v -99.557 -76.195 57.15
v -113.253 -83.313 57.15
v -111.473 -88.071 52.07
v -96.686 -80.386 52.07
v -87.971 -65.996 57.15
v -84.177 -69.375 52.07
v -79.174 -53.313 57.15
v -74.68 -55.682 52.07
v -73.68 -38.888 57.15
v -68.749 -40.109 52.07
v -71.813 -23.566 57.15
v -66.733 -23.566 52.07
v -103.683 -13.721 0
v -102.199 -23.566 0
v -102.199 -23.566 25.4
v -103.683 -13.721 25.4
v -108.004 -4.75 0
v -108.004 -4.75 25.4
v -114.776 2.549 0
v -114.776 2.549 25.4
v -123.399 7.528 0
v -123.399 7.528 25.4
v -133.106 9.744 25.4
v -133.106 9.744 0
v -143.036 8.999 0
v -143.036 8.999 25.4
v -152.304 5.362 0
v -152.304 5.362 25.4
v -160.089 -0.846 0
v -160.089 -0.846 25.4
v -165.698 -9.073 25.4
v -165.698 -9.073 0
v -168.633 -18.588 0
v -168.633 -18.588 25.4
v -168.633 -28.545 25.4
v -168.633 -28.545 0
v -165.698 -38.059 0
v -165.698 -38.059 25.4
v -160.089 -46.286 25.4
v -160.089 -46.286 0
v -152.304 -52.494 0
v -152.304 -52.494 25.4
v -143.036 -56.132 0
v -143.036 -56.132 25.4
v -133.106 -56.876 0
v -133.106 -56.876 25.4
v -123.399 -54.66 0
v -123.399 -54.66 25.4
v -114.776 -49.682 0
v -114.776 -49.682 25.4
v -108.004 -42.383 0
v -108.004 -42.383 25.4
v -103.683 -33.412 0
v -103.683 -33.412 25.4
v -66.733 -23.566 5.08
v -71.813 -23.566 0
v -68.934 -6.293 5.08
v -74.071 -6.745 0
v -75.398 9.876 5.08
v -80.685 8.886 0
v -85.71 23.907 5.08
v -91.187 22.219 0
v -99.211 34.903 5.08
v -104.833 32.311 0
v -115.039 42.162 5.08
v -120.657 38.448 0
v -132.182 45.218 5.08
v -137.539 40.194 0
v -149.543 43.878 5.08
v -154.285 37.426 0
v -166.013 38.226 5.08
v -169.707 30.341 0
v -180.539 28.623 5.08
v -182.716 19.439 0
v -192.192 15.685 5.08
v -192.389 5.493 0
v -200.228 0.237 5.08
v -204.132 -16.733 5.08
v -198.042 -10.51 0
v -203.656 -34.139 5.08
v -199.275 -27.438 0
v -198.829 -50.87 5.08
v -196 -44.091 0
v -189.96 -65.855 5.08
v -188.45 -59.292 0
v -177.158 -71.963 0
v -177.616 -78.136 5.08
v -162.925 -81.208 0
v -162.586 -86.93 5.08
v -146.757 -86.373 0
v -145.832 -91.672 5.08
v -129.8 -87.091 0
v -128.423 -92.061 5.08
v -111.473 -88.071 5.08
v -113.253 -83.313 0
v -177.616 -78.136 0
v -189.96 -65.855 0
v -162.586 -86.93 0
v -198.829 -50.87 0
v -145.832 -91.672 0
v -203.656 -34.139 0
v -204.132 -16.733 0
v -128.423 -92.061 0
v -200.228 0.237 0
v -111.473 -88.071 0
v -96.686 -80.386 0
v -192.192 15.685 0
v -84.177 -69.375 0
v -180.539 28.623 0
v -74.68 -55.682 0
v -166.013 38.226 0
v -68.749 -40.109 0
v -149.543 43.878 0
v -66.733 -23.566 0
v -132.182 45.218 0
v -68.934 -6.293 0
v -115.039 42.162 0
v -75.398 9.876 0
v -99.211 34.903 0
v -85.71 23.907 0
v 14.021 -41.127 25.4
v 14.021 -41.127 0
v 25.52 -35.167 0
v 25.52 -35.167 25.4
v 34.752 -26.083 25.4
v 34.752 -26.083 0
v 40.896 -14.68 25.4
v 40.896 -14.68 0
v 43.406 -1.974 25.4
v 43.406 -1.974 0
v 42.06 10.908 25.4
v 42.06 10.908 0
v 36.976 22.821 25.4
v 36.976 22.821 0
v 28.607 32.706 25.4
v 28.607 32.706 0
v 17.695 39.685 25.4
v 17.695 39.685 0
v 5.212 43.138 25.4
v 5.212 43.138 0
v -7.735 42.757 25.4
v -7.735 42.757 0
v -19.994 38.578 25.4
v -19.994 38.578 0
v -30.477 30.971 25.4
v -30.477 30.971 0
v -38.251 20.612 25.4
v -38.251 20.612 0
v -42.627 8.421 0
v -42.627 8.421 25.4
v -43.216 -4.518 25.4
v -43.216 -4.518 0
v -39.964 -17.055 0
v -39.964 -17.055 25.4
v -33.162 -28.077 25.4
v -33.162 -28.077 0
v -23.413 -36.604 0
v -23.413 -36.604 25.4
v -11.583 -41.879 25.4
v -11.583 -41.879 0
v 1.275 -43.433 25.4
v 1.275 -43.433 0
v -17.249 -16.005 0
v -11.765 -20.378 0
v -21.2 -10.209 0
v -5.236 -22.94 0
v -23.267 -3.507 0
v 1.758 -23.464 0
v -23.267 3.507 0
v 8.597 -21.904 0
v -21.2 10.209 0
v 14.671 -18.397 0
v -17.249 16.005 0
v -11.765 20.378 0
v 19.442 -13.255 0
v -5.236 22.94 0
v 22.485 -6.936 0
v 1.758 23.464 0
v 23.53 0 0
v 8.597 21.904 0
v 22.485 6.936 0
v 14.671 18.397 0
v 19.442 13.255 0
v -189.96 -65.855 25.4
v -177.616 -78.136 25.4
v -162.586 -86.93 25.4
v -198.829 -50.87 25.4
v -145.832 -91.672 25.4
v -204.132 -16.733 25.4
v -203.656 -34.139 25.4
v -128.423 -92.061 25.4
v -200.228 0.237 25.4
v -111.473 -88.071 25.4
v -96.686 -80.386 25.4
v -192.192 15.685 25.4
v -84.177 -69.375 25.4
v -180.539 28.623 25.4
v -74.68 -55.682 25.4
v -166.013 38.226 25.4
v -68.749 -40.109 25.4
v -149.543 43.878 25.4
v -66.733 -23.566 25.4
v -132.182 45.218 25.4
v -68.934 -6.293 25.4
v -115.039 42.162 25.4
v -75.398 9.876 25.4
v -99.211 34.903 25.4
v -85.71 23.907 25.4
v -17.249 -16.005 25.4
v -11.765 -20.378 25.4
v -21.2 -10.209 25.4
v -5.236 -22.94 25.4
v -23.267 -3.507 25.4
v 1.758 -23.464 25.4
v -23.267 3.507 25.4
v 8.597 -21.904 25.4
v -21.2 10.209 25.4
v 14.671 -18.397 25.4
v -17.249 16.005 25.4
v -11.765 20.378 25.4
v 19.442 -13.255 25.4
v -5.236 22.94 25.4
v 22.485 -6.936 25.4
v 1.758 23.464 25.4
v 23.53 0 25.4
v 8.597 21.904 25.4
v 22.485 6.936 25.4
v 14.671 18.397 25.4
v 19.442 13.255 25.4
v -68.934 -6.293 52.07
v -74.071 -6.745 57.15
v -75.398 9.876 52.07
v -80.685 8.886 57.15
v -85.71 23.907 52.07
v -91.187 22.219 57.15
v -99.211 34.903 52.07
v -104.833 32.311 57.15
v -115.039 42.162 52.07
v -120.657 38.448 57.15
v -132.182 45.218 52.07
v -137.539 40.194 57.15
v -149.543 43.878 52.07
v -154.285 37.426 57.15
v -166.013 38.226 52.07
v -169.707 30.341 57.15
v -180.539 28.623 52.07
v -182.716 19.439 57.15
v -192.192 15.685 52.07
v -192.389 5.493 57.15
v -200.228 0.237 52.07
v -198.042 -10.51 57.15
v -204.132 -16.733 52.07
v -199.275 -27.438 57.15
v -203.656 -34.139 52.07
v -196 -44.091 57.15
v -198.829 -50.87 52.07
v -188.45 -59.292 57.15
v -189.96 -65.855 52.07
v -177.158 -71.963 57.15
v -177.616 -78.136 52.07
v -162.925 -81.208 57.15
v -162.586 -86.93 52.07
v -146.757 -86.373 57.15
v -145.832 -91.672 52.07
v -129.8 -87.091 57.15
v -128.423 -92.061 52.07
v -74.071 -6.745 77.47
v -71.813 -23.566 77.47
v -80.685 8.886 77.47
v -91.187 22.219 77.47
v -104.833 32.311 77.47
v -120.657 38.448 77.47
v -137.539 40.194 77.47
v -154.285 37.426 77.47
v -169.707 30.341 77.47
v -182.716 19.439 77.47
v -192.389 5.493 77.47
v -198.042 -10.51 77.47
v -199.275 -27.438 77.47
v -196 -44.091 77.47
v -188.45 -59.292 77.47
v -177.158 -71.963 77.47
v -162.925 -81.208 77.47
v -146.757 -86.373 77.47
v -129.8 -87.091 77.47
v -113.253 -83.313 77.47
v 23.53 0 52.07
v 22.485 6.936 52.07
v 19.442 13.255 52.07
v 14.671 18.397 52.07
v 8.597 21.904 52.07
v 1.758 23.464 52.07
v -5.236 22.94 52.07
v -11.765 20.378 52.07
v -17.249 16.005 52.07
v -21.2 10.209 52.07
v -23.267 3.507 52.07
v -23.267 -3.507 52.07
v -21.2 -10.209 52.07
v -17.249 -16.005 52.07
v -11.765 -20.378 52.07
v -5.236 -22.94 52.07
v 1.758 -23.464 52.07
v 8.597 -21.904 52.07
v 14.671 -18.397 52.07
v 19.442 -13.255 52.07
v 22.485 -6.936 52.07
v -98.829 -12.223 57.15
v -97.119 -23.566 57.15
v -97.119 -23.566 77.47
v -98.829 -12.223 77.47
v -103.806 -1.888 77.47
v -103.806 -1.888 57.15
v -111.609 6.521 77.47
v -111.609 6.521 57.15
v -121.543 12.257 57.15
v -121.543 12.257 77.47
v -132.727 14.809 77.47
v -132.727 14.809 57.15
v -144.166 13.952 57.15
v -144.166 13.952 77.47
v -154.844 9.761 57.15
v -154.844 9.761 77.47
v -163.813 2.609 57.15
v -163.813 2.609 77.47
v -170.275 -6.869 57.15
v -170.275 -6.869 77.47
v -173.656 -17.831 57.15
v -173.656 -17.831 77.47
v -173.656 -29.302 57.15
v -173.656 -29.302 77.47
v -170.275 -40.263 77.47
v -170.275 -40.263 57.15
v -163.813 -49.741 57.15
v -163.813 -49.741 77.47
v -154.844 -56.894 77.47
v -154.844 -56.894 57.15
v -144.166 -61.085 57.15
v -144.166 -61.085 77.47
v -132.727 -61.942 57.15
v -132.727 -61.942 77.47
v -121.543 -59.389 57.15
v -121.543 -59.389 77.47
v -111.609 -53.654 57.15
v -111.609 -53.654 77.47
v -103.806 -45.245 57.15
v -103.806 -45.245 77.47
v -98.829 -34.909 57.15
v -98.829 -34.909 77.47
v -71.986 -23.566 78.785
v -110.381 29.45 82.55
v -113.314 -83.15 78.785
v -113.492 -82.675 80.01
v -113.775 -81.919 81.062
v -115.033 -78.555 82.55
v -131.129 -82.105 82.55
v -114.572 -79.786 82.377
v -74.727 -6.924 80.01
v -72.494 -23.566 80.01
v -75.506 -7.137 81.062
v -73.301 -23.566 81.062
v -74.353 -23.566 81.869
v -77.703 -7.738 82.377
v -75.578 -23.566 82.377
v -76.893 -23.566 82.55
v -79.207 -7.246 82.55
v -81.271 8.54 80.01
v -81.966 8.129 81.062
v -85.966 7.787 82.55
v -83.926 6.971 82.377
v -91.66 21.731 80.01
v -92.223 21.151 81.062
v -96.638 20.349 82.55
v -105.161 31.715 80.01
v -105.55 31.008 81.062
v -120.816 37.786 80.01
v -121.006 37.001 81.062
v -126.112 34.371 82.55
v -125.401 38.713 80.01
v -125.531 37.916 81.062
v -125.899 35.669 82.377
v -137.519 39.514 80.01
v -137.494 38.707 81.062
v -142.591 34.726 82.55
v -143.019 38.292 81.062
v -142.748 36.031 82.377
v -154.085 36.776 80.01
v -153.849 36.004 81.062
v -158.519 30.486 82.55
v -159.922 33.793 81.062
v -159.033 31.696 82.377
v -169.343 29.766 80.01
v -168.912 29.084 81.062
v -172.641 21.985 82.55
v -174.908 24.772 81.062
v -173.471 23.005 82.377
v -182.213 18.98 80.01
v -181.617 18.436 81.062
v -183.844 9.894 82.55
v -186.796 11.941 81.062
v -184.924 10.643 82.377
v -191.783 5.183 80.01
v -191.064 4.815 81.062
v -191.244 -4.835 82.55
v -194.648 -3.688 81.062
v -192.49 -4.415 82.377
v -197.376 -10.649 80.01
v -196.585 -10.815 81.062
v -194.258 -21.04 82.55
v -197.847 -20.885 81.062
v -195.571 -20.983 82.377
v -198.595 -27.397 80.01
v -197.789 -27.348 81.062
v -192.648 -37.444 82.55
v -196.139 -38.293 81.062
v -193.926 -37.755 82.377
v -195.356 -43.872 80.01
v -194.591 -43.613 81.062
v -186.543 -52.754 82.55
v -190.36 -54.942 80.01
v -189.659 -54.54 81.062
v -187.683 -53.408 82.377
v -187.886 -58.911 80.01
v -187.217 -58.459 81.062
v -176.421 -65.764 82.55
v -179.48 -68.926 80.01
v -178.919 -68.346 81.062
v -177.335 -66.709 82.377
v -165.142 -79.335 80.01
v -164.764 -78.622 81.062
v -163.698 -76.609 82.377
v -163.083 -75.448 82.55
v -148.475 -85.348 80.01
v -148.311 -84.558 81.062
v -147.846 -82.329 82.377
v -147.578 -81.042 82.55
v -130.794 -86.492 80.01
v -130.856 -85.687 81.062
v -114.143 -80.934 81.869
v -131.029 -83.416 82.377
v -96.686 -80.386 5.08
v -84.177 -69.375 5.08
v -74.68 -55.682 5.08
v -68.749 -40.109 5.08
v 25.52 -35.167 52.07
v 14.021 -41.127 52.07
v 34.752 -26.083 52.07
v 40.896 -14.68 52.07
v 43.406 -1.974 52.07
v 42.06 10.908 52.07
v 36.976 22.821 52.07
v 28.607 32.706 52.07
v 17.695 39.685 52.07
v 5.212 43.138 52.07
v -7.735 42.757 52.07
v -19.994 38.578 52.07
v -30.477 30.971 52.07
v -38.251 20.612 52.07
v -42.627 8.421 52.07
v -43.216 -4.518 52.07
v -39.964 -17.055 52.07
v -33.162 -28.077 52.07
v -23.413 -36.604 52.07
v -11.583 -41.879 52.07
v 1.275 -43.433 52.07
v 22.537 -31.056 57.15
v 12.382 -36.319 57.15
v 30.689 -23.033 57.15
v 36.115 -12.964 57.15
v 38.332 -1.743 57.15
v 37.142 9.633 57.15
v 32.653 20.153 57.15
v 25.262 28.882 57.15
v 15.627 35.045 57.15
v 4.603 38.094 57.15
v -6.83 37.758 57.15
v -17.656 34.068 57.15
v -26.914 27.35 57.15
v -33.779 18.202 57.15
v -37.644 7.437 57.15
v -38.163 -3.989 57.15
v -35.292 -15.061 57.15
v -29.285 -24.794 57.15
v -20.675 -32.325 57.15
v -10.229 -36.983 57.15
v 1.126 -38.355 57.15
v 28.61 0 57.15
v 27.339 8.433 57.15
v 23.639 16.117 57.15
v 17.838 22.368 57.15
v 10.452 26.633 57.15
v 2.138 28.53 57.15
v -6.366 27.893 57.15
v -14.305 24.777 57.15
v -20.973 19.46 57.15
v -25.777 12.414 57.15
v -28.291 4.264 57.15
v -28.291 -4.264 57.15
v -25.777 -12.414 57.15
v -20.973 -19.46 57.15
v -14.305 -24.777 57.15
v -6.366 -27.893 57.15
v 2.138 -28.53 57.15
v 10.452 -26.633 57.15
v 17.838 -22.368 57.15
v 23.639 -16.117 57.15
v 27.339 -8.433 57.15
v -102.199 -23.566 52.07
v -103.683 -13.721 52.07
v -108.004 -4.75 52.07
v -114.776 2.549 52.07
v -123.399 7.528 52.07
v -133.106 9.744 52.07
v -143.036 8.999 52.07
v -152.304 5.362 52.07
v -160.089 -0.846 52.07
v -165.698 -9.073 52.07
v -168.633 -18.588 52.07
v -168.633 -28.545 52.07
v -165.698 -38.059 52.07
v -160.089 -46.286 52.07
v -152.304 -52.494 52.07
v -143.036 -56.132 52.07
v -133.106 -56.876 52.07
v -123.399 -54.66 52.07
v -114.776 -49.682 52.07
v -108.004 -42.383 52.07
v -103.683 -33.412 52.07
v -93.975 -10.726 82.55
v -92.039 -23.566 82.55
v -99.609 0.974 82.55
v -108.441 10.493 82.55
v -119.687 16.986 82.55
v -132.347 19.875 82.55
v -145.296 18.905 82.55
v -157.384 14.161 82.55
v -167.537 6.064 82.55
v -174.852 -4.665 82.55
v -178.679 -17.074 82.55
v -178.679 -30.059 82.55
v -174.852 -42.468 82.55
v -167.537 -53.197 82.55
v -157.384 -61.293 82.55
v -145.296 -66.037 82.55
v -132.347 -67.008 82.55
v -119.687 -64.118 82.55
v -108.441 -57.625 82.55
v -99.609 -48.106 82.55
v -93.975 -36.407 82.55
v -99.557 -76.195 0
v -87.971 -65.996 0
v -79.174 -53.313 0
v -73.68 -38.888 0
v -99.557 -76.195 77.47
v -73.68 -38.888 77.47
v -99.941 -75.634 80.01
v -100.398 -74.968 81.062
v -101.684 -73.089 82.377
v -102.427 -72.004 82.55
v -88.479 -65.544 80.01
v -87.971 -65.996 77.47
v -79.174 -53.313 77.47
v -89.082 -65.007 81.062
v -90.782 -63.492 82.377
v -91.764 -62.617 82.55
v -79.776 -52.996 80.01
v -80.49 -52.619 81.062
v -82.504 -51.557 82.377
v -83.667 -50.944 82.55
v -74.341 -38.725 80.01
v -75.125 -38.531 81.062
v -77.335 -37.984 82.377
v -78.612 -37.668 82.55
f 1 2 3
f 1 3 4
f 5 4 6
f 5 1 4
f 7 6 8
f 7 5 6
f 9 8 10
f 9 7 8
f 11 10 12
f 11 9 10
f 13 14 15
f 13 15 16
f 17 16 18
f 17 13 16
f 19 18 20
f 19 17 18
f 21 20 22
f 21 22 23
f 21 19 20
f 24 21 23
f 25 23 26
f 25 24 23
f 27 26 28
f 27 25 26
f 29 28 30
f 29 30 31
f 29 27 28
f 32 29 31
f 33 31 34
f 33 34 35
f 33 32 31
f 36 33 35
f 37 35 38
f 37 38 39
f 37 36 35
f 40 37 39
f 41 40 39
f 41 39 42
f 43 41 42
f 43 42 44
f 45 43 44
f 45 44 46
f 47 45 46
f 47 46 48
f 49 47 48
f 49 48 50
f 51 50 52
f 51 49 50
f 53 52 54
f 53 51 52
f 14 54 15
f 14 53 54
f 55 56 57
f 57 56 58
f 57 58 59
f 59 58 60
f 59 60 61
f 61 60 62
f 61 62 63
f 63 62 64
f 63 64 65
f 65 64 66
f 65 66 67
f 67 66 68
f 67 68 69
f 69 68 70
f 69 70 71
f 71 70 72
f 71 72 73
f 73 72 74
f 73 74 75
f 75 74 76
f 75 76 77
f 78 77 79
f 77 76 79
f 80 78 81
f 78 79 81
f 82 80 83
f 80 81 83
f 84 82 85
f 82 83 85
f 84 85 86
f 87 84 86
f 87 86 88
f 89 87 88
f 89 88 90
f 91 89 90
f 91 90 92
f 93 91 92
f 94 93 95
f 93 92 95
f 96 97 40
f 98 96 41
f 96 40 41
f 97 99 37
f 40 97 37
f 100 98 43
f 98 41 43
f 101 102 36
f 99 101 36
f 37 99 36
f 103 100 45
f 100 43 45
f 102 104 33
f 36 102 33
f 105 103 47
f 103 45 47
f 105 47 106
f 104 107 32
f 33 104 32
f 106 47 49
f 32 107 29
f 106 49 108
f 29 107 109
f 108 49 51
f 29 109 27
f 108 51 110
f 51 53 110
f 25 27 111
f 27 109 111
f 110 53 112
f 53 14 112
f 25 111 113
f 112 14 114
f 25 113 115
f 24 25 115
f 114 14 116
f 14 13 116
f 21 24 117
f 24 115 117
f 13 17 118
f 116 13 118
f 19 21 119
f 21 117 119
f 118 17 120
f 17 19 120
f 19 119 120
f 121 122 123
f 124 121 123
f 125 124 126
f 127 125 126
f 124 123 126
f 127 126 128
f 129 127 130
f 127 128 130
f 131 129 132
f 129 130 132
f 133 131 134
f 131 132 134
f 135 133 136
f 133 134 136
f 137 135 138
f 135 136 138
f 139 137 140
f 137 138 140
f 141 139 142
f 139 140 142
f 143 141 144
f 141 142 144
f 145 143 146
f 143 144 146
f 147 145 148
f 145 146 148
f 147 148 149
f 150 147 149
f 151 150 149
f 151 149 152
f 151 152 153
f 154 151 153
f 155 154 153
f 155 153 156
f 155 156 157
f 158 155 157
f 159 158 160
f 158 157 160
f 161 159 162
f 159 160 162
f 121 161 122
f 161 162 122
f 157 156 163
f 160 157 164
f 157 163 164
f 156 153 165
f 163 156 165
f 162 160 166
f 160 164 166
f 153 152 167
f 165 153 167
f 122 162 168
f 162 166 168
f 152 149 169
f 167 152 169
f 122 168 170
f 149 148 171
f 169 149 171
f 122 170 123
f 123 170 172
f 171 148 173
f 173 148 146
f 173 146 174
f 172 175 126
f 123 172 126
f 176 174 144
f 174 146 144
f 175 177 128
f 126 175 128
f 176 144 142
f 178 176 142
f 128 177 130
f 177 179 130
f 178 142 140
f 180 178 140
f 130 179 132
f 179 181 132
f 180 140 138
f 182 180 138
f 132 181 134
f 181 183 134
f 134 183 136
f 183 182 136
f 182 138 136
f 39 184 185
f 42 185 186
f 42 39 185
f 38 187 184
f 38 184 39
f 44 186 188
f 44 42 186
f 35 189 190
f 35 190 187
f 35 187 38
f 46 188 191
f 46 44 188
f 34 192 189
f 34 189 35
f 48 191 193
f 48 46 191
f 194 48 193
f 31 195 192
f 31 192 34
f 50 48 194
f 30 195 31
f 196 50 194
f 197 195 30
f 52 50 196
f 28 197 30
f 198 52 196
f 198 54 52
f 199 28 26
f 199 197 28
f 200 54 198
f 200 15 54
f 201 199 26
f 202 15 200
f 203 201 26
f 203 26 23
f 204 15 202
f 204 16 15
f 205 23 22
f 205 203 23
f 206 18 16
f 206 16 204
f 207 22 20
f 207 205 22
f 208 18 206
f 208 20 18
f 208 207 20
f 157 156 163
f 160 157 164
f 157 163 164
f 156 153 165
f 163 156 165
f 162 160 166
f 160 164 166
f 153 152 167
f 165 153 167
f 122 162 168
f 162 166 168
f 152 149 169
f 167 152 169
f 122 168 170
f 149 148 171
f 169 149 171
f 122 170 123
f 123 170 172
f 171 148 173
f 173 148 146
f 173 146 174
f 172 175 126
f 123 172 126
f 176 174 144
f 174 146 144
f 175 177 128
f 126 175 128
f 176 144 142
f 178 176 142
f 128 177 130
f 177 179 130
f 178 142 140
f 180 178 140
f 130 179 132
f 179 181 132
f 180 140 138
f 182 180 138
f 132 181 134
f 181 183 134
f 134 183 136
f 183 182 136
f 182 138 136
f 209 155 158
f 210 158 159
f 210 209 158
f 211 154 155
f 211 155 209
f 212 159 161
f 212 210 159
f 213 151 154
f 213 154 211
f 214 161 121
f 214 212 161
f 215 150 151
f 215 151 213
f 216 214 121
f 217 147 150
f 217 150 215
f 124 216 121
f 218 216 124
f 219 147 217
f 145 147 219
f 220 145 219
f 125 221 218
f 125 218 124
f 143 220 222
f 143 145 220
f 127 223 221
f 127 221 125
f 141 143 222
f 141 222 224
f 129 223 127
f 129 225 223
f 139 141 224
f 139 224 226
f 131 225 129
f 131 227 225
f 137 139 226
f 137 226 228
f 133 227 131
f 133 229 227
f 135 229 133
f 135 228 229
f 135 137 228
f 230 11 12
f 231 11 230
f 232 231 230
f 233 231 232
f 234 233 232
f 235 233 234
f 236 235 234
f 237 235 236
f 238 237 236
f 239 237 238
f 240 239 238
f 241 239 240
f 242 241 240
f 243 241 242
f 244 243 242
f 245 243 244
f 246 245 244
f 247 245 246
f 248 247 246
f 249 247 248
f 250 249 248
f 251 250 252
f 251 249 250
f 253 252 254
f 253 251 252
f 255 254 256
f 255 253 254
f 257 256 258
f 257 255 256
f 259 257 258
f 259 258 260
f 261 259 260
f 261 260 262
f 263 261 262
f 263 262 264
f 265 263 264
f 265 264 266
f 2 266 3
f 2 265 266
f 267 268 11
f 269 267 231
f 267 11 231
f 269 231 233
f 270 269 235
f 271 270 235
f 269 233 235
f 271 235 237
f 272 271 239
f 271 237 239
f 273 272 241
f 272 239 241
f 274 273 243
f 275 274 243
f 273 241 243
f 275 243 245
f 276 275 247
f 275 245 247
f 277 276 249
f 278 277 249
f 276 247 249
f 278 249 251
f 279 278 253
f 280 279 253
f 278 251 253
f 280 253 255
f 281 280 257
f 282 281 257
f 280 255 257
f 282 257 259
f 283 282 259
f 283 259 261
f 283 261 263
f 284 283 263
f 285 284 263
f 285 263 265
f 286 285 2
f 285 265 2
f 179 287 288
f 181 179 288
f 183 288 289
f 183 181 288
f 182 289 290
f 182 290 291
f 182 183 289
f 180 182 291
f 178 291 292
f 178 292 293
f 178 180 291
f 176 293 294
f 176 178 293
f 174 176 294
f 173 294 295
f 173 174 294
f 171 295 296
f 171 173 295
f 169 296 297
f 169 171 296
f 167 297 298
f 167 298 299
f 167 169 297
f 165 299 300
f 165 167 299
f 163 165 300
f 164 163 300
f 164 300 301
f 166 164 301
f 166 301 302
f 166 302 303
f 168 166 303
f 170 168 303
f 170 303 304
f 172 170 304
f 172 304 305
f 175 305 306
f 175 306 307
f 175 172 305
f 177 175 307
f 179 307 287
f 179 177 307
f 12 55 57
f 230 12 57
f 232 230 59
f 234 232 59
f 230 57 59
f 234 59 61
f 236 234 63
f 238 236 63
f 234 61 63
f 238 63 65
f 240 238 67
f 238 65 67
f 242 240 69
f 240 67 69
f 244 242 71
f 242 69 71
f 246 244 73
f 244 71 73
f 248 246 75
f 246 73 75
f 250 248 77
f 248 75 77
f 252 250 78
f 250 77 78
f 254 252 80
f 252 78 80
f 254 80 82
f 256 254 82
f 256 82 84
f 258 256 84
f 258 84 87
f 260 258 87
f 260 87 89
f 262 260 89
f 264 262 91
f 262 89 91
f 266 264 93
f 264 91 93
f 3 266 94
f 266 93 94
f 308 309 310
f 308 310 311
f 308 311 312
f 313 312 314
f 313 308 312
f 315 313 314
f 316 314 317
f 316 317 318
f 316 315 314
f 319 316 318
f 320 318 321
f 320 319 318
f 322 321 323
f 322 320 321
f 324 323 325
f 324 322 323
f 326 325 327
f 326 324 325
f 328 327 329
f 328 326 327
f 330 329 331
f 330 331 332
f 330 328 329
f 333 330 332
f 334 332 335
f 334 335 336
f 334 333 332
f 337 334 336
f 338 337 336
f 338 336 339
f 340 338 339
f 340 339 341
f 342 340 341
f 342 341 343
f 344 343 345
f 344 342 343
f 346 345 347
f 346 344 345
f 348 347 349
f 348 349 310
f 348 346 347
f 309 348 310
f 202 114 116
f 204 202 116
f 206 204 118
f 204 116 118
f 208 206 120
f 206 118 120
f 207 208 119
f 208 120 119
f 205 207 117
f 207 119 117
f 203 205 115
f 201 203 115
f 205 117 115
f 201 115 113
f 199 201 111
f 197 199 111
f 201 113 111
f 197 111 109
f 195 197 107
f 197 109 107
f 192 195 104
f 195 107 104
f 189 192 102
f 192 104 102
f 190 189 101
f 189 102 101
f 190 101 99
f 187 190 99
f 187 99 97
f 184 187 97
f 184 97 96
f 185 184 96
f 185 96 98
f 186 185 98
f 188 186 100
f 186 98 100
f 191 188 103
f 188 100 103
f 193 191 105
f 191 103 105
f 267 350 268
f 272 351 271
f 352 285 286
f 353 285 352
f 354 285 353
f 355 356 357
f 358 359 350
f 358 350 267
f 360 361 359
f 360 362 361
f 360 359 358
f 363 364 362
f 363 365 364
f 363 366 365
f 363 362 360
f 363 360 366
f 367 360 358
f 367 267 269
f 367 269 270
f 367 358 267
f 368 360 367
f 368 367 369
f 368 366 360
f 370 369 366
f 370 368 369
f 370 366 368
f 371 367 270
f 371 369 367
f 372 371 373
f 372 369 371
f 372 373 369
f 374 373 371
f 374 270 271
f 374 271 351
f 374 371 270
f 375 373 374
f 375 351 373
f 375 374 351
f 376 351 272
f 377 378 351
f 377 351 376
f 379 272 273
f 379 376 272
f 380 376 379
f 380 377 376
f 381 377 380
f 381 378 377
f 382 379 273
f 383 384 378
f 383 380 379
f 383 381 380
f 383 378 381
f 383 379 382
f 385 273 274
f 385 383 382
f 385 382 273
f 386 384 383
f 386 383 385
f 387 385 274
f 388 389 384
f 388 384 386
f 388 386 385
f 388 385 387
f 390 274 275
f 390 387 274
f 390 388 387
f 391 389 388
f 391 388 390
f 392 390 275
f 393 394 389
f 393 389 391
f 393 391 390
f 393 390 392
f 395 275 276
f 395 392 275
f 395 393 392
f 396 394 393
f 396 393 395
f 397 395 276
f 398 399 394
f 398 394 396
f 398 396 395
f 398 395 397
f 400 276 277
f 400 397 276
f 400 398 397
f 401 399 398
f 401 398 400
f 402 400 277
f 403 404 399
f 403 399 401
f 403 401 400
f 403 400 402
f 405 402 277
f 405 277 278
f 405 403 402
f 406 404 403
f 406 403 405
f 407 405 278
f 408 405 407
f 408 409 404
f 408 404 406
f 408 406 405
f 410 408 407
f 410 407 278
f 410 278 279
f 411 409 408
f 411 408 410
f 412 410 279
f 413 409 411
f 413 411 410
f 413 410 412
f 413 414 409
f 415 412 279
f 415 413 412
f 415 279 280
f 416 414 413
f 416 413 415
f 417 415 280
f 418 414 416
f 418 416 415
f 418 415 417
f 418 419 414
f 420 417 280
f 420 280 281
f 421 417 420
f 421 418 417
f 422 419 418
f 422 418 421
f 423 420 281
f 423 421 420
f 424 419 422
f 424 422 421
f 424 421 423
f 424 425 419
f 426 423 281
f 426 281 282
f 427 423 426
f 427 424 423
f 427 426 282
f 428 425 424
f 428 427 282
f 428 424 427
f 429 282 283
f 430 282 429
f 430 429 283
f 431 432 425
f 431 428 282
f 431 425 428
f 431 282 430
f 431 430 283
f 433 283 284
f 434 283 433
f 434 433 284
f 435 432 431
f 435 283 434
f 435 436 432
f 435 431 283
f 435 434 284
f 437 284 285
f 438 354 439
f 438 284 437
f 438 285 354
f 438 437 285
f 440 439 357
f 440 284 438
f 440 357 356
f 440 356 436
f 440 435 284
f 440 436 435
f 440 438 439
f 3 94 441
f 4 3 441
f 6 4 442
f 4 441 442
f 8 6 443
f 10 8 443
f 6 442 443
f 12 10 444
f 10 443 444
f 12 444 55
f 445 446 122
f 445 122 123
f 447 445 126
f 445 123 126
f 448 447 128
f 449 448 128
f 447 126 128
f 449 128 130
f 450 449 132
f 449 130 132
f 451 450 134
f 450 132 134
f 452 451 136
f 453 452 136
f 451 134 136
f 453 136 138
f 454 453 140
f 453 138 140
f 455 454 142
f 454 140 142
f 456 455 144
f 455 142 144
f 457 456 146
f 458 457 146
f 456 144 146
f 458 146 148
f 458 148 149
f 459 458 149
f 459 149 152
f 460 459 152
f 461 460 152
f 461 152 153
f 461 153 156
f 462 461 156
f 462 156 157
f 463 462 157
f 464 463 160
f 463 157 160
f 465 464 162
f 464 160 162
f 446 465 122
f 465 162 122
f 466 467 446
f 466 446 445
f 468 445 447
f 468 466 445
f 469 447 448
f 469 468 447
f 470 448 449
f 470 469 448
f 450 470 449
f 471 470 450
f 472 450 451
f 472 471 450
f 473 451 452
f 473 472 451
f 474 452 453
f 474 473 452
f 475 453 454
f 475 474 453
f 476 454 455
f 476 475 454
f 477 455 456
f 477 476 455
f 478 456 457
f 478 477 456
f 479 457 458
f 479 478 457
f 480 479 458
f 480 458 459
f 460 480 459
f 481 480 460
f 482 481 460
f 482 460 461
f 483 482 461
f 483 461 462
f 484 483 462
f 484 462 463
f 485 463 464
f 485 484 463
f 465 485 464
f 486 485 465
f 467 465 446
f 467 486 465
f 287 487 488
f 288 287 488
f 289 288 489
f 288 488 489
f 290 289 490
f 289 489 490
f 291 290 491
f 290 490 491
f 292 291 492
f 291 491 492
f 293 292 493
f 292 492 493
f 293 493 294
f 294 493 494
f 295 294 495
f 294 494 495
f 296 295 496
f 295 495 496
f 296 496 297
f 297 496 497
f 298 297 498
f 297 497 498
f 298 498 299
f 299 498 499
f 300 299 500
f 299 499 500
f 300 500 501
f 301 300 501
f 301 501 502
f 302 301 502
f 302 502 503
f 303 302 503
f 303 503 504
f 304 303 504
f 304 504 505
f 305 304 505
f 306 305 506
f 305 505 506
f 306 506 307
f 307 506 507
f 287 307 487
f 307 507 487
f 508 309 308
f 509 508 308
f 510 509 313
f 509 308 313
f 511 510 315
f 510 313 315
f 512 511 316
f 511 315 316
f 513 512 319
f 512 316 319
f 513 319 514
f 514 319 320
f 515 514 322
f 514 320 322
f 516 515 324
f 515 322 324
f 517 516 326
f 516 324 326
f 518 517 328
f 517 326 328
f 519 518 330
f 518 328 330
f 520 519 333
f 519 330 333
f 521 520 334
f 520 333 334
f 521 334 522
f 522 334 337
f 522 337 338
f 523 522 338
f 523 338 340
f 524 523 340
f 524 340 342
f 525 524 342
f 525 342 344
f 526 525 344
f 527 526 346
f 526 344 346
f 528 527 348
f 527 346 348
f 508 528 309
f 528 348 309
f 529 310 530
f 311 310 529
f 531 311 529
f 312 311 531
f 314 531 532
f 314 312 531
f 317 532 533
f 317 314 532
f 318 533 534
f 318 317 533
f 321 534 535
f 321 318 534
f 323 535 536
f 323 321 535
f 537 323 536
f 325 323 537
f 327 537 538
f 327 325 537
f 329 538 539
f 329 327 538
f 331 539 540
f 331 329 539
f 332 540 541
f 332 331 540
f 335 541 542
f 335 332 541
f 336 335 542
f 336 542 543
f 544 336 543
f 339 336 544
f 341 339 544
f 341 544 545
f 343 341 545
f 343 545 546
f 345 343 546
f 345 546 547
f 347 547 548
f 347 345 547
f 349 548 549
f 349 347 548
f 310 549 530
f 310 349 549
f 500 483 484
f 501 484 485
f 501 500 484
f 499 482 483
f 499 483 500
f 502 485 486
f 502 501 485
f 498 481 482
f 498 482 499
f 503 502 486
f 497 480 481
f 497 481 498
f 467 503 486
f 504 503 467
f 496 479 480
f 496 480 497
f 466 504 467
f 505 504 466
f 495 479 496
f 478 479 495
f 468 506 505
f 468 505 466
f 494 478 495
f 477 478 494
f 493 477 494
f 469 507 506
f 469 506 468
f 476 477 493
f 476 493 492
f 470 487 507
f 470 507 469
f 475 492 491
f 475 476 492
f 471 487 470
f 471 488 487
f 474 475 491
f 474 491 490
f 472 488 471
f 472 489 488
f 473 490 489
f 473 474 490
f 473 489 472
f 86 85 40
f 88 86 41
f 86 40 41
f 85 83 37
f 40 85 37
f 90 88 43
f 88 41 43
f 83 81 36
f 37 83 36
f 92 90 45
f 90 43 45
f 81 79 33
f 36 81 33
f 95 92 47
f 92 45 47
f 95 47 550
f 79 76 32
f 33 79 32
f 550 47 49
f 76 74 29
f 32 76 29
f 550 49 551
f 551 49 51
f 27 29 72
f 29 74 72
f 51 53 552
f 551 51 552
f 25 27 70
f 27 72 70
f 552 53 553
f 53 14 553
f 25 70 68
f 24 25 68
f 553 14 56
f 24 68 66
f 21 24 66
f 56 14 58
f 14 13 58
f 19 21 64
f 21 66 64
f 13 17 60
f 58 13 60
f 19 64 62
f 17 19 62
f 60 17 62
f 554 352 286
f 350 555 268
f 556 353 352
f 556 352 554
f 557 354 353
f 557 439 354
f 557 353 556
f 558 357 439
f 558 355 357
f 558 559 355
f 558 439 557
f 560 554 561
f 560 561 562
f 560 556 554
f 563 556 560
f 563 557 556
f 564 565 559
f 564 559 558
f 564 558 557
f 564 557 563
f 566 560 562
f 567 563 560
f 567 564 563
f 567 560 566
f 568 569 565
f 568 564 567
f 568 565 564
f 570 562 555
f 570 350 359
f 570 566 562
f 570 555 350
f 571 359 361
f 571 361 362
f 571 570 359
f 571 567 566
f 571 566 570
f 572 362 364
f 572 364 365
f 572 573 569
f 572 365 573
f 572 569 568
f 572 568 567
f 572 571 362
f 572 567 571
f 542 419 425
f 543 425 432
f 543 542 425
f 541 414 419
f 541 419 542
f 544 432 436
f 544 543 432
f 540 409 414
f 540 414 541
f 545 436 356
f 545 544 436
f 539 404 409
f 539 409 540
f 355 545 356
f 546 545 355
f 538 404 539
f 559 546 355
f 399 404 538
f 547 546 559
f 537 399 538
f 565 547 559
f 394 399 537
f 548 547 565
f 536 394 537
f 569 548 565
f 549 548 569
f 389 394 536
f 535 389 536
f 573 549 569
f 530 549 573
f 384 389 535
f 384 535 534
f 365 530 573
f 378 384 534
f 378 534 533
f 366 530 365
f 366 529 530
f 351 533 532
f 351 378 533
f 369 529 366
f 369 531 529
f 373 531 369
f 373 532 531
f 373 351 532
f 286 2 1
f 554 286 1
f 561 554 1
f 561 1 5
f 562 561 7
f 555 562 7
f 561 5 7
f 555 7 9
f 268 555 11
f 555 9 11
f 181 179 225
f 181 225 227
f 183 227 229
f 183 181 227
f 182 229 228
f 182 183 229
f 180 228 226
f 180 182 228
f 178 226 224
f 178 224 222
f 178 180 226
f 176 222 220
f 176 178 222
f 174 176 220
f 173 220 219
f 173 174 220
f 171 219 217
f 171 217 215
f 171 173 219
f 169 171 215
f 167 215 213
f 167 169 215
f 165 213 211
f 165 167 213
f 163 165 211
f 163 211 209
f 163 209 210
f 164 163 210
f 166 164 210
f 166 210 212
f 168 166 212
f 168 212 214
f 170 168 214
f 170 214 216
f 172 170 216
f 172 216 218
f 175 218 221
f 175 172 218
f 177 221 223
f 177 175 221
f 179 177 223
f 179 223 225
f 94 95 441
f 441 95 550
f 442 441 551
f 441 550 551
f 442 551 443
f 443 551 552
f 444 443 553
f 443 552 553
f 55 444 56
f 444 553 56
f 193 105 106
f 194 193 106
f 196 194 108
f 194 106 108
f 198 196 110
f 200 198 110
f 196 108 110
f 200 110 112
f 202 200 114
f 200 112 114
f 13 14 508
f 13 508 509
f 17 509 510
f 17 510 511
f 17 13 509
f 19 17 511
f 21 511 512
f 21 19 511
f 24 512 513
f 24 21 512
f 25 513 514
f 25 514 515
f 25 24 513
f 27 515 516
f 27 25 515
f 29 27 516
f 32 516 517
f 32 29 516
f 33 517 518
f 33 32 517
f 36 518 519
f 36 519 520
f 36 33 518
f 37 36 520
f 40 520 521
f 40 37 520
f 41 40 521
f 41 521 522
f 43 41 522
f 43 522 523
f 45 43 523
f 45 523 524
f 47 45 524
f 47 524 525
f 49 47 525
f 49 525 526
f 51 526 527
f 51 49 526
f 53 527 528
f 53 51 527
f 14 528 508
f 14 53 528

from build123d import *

# Parameters (mm, degrees)
F0_R      = 33.4031923569
F1_DEPTH  = 57.15
F0_R_2    = 23.5302271484
F2_DEPTH  = 25.4
F3_SIZE   = 5.08
F3_2_SIZE = 5.08
F4_DEPTH  = 25.4
F5_R      = 5.08
F6_SIZE   = 5.08


with BuildPart() as f1:
    # F0 (on Top) → F1 (new body)
    with BuildSketch(Plane.XY):
        with BuildLine():
            ThreePointArc((-111.4734922268, -88.070607267), (-79.0129136651, -62.8171326984), (-66.7329917311, -23.5662644833))
            ThreePointArc((-66.7329917311, -23.5662644833), (-85.9374640879, 24.1453452767), (-132.8404473474, 45.2479428834))
            ThreePointArc((-132.8404473474, 45.2479428834), (-203.6044087614, -34.4649077917), (-111.4734922268, -88.070607267))
        make_face()
        with Locations((-135.6026127041, -23.5662644833)):
            Circle(F0_R, mode=Mode.SUBTRACT)
    extrude(amount=F1_DEPTH)

    # F3
    f3_edges = [f1.edges().sort_by_distance(p)[0] for p in [
        (-159.731733, 40.938078, 0),
        (-111.473492, -88.070607, 28.575),
        (-159.731733, 40.938078, 57.15),
        (-169.005805, -23.566264, 57.15),
    ]]
    chamfer(f3_edges, length=F3_SIZE)

    # F4 (add): a face of the model
    f4_faces = [f1.faces().sort_by_distance(p)[0] for p in [
        (-157.3197738153, 34.4901908242, 57.15),
    ]]
    extrude(f4_faces, amount=F4_DEPTH)

    # F5
    f5_edges = [f1.edges().sort_by_distance(p)[0] for p in [
        (-157.951907, 36.180072, 82.55),
    ]]
    fillet(f5_edges, radius=F5_R)

    # F6
    f6_edges = [f1.edges().sort_by_distance(p)[0] for p in [
        (-174.085805, -23.566264, 82.55),
    ]]
    chamfer(f6_edges, length=F6_SIZE)


with BuildPart() as f1b:
    # F0 (on Top) → F1, piece 2 (new body)
    with BuildSketch(Plane.XY):
        with BuildLine():
            ThreePointArc((43.4512658516, 0), (-35.3357747424, 25.2862715216), (14.0207986405, -41.1269949011))
            ThreePointArc((14.0207986405, -41.1269949011), (35.3357747424, -25.2862715216), (43.4512658516, 0))
        make_face()
        Circle(F0_R_2, mode=Mode.SUBTRACT)
    extrude(amount=F1_DEPTH)

    # F3#2
    f3_2_edges = [f1b.edges().sort_by_distance(p)[0] for p in [
        (-14.020799, 41.126995, 57.15),
        (-23.530227, 0, 57.15),
    ]]
    chamfer(f3_2_edges, length=F3_2_SIZE)


with BuildPart() as f2:
    # F0 (on Top) → F2 (new body)
    with BuildSketch(Plane.XY):
        with BuildLine():
            ThreePointArc((-111.4734922268, -88.070607267), (-79.0129136651, -62.8171326984), (-66.7329917311, -23.5662644833))
            ThreePointArc((-66.7329917311, -23.5662644833), (-85.9374640879, 24.1453452767), (-132.8404473474, 45.2479428834))
            ThreePointArc((-132.8404473474, 45.2479428834), (-203.6044087614, -34.4649077917), (-111.4734922268, -88.070607267))
        make_face()
        with Locations((-135.6026127041, -23.5662644833)):
            Circle(F0_R, mode=Mode.SUBTRACT)
    extrude(amount=F2_DEPTH)


with BuildPart() as f2b:
    # F0 (on Top) → F2, piece 2 (new body)
    with BuildSketch(Plane.XY):
        with BuildLine():
            ThreePointArc((43.4512658516, 0), (-35.3357747424, 25.2862715216), (14.0207986405, -41.1269949011))
            ThreePointArc((14.0207986405, -41.1269949011), (35.3357747424, -25.2862715216), (43.4512658516, 0))
        make_face()
        Circle(F0_R_2, mode=Mode.SUBTRACT)
    extrude(amount=F2_DEPTH)


solid = Compound([f1.part, f1b.part, f2.part, f2b.part])
